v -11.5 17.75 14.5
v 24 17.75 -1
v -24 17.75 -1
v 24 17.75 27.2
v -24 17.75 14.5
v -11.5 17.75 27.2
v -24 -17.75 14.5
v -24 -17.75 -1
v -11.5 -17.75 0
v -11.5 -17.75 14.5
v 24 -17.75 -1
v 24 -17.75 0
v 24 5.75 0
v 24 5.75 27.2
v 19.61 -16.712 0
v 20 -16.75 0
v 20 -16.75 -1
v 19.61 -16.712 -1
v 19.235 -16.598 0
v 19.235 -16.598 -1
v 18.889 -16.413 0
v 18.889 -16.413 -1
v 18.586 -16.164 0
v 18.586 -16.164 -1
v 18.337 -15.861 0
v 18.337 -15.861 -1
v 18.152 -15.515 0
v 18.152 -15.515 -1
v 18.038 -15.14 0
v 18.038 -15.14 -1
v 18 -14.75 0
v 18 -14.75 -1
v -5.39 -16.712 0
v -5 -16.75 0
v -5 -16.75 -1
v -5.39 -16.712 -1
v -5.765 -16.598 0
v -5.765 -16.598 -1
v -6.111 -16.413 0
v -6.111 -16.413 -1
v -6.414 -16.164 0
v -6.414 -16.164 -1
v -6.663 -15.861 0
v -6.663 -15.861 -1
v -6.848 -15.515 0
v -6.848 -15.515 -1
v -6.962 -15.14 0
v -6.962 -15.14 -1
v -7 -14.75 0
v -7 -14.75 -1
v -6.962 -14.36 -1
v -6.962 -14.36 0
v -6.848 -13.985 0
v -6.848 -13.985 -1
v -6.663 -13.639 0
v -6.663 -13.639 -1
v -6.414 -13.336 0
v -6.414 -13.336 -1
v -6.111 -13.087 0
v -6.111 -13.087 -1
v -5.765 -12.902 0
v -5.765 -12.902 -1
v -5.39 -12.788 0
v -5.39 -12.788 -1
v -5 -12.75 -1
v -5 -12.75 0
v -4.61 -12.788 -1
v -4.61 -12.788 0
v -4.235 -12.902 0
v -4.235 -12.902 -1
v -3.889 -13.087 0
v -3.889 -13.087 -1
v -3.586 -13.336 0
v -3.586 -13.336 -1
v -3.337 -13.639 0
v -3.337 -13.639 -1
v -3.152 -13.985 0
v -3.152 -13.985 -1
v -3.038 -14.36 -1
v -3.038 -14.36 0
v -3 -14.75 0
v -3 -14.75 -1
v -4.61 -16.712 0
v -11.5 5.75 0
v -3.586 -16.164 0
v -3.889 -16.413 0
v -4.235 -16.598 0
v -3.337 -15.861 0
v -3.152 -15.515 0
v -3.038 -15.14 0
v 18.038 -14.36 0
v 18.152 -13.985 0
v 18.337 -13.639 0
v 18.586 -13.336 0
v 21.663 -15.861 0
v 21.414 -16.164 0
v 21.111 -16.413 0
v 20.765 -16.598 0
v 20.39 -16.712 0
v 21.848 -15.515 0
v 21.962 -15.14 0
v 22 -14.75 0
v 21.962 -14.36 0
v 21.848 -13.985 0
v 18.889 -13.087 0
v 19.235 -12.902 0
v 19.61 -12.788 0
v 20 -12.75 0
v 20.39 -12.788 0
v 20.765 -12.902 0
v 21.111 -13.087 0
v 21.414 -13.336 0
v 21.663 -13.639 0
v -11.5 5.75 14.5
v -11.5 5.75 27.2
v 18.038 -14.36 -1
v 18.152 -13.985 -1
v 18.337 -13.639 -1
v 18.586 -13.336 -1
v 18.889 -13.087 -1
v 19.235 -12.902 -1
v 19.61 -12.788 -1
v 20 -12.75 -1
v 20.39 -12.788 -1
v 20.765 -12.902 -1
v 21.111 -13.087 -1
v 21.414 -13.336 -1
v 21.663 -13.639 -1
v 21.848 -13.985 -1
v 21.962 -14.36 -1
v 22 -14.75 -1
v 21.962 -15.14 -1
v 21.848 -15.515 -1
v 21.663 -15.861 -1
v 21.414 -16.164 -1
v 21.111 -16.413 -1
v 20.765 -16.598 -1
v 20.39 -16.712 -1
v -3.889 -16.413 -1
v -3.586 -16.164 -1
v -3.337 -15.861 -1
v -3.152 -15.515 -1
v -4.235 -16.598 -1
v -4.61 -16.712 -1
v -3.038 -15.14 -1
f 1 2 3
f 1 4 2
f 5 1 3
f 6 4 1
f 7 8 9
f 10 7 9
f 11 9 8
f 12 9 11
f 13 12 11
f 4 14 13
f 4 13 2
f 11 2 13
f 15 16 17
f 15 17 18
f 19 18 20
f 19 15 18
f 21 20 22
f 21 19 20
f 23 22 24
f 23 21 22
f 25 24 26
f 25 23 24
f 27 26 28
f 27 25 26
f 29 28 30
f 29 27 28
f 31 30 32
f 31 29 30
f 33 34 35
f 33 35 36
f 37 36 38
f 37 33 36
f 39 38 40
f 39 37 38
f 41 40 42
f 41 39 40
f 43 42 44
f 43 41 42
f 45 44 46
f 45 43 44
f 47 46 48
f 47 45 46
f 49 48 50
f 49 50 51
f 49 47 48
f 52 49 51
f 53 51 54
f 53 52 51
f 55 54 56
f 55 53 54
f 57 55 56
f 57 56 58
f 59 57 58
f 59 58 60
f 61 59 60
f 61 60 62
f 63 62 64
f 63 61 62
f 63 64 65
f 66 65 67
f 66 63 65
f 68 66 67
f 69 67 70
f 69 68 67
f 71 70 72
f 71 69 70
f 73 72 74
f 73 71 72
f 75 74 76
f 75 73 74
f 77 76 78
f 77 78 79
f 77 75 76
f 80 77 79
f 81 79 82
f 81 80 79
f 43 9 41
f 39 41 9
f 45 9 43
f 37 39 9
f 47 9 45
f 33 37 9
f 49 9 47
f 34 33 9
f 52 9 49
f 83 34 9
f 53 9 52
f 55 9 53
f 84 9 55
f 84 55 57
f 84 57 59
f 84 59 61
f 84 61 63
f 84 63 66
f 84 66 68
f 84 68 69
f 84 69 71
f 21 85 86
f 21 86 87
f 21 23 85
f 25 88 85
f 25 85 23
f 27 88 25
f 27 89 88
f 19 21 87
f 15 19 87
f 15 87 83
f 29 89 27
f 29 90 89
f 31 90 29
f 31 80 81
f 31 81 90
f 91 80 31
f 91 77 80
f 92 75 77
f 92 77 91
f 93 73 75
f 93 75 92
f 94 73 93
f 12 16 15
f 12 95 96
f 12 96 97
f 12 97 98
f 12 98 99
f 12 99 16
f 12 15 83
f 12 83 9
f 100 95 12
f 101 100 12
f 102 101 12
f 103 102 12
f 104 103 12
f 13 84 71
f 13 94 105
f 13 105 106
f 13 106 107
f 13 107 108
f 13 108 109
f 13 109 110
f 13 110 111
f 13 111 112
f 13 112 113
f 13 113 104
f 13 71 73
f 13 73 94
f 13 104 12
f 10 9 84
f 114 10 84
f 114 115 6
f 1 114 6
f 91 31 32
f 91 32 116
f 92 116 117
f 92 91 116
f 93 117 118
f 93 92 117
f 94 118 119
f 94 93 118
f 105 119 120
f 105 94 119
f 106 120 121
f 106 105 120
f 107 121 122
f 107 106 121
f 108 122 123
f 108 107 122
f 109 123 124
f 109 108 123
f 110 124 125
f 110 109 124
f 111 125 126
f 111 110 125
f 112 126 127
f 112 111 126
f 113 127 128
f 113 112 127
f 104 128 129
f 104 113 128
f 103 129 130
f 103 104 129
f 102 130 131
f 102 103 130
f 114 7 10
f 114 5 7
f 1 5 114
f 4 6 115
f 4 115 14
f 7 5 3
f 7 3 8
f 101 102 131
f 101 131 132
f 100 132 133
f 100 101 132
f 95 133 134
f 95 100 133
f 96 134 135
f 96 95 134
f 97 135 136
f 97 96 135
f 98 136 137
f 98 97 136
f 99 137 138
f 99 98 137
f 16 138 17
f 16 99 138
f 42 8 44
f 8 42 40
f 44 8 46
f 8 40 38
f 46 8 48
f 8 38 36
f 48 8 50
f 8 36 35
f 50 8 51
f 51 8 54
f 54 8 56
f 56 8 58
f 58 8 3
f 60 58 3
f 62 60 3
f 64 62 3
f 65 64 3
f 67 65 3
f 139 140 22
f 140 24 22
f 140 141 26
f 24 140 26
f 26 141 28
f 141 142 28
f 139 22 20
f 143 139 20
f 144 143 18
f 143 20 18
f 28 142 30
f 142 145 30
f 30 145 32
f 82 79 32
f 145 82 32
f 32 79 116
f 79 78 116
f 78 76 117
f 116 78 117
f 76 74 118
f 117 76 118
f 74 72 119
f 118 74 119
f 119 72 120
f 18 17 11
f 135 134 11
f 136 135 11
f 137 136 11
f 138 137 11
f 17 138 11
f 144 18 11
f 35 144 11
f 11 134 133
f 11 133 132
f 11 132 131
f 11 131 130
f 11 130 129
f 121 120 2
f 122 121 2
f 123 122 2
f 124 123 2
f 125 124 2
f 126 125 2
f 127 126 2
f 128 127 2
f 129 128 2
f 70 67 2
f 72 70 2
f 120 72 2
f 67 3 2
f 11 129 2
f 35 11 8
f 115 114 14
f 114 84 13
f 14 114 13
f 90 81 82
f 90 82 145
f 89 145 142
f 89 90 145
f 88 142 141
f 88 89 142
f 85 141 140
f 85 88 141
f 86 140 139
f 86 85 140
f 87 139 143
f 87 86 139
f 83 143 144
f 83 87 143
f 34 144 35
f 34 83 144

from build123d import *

# Parameters (mm, degrees)
F1_DEPTH = 14.5
F0_W     = 35.5
F0_H     = 12
F2_DEPTH = 27.2
F3_DEPTH = 1


with BuildPart() as f1:
    # F0 (on Top) → F1 (new body)
    with BuildSketch(Plane.XY):
        Polygon((-24, -17.75), (-11.5, -17.75), (-11.5, -16.75), (-11.5, 5.75), (-11.5, 17.75), (-24, 17.75), align=None)
    extrude(amount=F1_DEPTH)

    # F0 (on Top) → F2 (join)
    with BuildSketch(Plane.XY):
        with Locations((6.25, 11.75)):
            Rectangle(F0_W, F0_H)
    extrude(amount=F2_DEPTH)

    # F0 (on Top) → F3 (join)
    with BuildSketch(Plane.XY):
        with Locations((6.25, 11.75)):
            Rectangle(F0_W, F0_H)
        Polygon((-11.5, -17.75), (24, -17.75), (24, -16.75), (20, -16.75), (-5, -16.75), (-11.5, -16.75), align=None)
        Polygon((-24, -17.75), (-11.5, -17.75), (-11.5, -16.75), (-11.5, 5.75), (-11.5, 17.75), (-24, 17.75), align=None)
        with BuildLine():
            Line((-11.5, 5.75), (-11.5, -16.75))
            Line((-11.5, -16.75), (-5, -16.75))
            ThreePointArc((-5, -16.75), (-6.4142135624, -13.3357864376), (-3, -14.75))
            Line((-3, -14.75), (18, -14.75))
            ThreePointArc((18, -14.75), (20, -12.75), (22, -14.75))
            Line((22, -14.75), (24, -14.75))
            Line((24, -14.75), (24, 5.75))
            Line((24, 5.75), (-11.5, 5.75))
        make_face()
        with BuildLine():
            Line((-5, -16.75), (20, -16.75))
            ThreePointArc((20, -16.75), (18.5857864376, -16.1642135624), (18, -14.75))
            Line((18, -14.75), (-3, -14.75))
            ThreePointArc((-3, -14.75), (-3.5857864376, -16.1642135624), (-5, -16.75))
        make_face()
        with BuildLine():
            Line((20, -16.75), (24, -16.75))
            Line((24, -16.75), (24, -14.75))
            Line((24, -14.75), (22, -14.75))
            ThreePointArc((22, -14.75), (21.4142135624, -16.1642135624), (20, -16.75))
        make_face()
    extrude(amount=-F3_DEPTH)


solid = f1.part
